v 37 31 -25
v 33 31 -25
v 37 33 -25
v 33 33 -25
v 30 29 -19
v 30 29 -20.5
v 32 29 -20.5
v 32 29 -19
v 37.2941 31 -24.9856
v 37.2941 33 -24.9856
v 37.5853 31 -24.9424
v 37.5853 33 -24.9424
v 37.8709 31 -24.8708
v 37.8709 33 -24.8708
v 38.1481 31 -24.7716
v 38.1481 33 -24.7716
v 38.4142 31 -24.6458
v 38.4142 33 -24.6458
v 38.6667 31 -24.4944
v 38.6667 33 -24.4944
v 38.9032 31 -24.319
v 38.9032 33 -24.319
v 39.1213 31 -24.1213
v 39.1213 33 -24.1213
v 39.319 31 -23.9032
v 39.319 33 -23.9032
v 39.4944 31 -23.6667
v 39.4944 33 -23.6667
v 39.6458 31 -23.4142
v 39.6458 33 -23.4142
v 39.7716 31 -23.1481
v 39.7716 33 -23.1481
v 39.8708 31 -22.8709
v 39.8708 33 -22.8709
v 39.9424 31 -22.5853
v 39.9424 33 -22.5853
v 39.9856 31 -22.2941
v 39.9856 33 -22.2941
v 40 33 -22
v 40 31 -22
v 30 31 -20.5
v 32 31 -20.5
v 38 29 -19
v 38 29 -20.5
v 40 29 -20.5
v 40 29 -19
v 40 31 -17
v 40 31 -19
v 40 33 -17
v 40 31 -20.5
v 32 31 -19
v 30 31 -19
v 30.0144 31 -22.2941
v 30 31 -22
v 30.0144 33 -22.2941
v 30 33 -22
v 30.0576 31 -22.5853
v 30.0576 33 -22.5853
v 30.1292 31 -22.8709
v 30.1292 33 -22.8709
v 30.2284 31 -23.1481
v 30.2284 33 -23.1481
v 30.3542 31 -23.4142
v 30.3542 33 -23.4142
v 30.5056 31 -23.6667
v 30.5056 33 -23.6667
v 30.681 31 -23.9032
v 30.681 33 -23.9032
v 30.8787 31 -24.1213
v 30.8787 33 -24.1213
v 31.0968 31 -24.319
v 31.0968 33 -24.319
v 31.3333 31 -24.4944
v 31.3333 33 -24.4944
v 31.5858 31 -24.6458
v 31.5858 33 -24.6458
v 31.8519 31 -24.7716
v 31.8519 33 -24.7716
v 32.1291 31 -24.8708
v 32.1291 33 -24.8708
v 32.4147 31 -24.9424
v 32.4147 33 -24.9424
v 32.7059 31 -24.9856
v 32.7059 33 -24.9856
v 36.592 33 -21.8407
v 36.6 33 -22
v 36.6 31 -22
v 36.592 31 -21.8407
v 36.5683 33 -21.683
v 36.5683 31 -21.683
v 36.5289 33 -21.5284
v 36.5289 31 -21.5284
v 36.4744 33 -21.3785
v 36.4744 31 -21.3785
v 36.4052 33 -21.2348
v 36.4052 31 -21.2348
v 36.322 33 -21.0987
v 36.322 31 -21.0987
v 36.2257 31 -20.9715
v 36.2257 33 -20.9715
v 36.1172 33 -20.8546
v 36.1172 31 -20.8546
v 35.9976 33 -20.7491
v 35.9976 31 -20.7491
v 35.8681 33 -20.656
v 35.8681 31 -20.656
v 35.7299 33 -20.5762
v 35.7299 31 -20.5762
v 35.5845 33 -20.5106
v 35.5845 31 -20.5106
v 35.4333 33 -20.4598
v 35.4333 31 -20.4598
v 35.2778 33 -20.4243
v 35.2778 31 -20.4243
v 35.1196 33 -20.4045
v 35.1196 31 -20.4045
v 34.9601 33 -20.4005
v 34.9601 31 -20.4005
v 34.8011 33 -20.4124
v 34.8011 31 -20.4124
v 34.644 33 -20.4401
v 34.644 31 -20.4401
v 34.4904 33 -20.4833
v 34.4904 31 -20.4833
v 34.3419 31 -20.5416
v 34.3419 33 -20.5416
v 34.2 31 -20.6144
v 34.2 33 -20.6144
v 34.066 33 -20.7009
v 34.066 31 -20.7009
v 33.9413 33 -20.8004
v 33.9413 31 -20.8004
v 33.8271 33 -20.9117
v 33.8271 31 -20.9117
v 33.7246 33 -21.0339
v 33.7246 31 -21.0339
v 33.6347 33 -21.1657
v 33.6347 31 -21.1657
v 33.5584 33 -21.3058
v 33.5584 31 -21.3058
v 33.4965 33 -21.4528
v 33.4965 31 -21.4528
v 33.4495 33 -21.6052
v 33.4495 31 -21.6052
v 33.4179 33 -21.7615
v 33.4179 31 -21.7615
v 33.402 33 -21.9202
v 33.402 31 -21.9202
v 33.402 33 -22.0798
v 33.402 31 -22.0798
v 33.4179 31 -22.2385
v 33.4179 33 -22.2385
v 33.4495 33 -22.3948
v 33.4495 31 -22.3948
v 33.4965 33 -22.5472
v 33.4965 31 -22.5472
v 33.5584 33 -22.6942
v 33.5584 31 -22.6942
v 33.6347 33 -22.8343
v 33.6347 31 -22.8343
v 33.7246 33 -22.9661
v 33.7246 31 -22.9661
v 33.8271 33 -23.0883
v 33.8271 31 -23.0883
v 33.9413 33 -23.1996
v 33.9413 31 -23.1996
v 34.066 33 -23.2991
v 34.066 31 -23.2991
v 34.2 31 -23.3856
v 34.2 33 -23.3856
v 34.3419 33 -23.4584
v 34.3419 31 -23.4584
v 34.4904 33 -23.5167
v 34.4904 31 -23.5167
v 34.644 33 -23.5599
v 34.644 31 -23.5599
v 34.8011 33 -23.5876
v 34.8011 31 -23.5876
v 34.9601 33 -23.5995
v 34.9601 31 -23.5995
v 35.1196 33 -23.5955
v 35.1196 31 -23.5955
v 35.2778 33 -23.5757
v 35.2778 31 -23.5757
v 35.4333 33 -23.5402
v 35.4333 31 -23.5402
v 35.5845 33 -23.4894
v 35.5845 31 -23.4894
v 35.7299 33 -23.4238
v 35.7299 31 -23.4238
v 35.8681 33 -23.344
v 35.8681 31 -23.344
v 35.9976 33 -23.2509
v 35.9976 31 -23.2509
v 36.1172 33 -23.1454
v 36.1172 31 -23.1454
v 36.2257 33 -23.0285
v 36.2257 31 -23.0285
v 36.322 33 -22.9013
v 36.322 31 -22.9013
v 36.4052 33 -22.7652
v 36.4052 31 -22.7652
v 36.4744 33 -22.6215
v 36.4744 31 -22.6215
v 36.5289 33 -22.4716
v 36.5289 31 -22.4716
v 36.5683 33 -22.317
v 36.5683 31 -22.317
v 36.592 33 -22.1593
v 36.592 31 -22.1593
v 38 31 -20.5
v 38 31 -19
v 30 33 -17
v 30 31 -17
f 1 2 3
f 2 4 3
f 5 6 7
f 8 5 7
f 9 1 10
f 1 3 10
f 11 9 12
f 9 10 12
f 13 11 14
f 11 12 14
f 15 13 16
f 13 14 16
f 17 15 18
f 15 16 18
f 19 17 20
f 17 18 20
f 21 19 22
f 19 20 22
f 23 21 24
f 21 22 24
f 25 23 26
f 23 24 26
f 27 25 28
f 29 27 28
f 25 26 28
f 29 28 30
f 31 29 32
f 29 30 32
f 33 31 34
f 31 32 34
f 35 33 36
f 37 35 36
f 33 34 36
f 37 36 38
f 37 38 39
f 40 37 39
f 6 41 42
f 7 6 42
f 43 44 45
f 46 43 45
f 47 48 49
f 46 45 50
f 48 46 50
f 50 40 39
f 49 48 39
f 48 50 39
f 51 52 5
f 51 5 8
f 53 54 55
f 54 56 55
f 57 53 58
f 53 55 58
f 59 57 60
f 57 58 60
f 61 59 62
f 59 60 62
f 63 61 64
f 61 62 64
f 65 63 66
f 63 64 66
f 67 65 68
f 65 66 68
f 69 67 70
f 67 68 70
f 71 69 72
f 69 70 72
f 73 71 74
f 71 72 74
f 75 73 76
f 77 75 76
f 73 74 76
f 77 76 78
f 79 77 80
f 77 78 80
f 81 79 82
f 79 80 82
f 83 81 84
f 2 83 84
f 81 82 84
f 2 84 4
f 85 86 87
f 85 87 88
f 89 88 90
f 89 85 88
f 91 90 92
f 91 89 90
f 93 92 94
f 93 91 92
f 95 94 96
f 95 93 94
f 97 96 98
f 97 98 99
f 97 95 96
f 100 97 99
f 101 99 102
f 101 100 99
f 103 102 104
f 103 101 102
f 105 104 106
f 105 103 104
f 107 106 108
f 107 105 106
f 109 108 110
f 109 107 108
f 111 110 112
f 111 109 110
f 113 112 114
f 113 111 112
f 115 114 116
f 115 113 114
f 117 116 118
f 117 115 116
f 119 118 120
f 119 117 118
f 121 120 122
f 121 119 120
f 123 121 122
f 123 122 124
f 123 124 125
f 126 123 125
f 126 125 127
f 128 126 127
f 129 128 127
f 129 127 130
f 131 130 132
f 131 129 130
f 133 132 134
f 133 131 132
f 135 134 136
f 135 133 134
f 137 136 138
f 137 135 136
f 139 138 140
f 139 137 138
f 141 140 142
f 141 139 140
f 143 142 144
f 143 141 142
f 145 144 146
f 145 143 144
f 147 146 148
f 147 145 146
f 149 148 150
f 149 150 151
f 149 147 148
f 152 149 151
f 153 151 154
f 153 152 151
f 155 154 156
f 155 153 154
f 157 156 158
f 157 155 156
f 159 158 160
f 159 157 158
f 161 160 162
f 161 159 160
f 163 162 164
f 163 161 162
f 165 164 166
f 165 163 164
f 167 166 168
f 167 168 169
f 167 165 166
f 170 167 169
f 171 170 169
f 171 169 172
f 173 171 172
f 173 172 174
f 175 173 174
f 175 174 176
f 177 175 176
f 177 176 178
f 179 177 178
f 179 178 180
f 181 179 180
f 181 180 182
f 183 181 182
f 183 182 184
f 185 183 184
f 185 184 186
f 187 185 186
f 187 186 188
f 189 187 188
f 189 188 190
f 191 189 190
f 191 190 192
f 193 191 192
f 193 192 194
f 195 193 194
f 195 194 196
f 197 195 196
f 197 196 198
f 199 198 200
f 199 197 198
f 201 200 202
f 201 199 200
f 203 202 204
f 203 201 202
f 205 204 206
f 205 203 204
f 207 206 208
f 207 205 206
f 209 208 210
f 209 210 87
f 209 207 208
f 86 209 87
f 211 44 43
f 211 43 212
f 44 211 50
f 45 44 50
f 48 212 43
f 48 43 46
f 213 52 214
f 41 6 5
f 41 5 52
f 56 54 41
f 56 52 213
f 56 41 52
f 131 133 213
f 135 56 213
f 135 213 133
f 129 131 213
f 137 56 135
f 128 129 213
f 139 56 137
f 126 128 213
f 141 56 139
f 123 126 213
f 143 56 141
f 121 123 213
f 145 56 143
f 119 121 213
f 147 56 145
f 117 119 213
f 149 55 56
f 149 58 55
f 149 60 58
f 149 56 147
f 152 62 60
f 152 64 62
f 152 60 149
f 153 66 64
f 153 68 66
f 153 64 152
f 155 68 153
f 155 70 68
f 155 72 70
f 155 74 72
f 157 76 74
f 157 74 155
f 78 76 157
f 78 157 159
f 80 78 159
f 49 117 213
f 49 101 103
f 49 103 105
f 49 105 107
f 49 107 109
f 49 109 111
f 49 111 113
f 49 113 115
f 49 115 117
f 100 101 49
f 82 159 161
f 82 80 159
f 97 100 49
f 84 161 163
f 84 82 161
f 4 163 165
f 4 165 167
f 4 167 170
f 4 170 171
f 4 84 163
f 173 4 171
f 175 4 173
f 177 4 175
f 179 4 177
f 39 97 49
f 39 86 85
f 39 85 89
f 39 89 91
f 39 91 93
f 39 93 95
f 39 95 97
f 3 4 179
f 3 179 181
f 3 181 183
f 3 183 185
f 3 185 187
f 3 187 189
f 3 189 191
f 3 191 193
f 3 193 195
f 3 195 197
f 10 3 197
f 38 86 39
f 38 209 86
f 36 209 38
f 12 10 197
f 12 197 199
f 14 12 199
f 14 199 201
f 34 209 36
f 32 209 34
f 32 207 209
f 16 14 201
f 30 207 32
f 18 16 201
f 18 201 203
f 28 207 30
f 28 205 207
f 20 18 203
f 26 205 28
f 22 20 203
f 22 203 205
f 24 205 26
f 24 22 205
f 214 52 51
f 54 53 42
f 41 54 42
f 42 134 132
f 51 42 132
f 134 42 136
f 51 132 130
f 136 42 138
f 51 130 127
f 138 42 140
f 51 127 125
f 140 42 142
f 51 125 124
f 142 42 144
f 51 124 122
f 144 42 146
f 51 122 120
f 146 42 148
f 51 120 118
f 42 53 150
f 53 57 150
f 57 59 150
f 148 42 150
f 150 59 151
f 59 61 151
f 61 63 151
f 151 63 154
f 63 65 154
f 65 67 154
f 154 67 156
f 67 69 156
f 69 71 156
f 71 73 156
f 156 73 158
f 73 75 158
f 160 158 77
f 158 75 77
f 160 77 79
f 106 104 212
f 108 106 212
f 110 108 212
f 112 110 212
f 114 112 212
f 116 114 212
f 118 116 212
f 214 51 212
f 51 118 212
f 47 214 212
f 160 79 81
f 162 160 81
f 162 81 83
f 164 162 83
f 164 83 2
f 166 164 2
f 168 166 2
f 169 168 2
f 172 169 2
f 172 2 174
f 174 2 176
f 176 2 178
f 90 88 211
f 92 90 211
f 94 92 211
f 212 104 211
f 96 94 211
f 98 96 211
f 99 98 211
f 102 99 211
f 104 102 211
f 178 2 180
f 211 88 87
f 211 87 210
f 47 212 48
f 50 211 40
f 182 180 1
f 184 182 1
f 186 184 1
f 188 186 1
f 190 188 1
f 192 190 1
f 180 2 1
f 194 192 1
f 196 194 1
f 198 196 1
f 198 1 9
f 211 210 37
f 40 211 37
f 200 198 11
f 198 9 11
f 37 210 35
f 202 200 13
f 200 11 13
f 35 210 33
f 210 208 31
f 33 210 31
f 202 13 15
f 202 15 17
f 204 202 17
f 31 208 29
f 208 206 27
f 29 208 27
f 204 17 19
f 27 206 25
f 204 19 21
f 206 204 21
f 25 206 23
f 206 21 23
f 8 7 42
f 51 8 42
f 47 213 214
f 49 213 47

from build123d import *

# Parameters (mm, degrees)
CYLINDER070_R     = 1.6
CYLINDER070_DEPTH = 2
BOX178_W          = 10
BOX178_H          = 2
BOX178_DEPTH      = 8
FILLET039_R       = 3
BOX180_W          = 2
BOX180_H          = 2
BOX180_DEPTH      = 1.5
BOX179_W          = 2
BOX179_H          = 2
BOX179_DEPTH      = 1.5


with BuildPart() as cylinder151:
    # Cylinder070 → Cylinder070 (new body)
    with BuildSketch(Plane(origin=(35, 33, -22), x_dir=(1, 0, 0), z_dir=(0, -1, 0))):
        Circle(CYLINDER070_R)
    extrude(amount=CYLINDER070_DEPTH)


with BuildPart() as fillet039:
    # Box178 → Box178 (new body)
    with BuildSketch(Plane(origin=(30, 31, -25), x_dir=(1, 0, 0), z_dir=(0, 0, 1))):
        with Locations((5, 1)):
            Rectangle(BOX178_W, BOX178_H)
    extrude(amount=BOX178_DEPTH)

    # Cut094: cut Cylinder151
    add(cylinder151.part, mode=Mode.SUBTRACT)

    # Fillet039
    fillet039_edges = [fillet039.edges().sort_by_distance(p)[0] for p in [
        (30, 32, -25),
        (40, 32, -25),
    ]]
    fillet(fillet039_edges, radius=FILLET039_R)


with BuildPart() as cube169:
    # Box180 → Box180 (new body)
    with BuildSketch(Plane(origin=(30, 29, -20.5), x_dir=(1, 0, 0), z_dir=(0, 0, 1))):
        with Locations((1, 1)):
            Rectangle(BOX180_W, BOX180_H)
    extrude(amount=BOX180_DEPTH)


with BuildPart() as fusion054:
    # Box179 → Box179 (new body)
    with BuildSketch(Plane(origin=(38, 29, -20.5), x_dir=(1, 0, 0), z_dir=(0, 0, 1))):
        with Locations((1, 1)):
            Rectangle(BOX179_W, BOX179_H)
    extrude(amount=BOX179_DEPTH)

    # Fusion054: union Fillet039, Cube169
    add(fillet039.part)
    add(cube169.part)


solid = fusion054.part
